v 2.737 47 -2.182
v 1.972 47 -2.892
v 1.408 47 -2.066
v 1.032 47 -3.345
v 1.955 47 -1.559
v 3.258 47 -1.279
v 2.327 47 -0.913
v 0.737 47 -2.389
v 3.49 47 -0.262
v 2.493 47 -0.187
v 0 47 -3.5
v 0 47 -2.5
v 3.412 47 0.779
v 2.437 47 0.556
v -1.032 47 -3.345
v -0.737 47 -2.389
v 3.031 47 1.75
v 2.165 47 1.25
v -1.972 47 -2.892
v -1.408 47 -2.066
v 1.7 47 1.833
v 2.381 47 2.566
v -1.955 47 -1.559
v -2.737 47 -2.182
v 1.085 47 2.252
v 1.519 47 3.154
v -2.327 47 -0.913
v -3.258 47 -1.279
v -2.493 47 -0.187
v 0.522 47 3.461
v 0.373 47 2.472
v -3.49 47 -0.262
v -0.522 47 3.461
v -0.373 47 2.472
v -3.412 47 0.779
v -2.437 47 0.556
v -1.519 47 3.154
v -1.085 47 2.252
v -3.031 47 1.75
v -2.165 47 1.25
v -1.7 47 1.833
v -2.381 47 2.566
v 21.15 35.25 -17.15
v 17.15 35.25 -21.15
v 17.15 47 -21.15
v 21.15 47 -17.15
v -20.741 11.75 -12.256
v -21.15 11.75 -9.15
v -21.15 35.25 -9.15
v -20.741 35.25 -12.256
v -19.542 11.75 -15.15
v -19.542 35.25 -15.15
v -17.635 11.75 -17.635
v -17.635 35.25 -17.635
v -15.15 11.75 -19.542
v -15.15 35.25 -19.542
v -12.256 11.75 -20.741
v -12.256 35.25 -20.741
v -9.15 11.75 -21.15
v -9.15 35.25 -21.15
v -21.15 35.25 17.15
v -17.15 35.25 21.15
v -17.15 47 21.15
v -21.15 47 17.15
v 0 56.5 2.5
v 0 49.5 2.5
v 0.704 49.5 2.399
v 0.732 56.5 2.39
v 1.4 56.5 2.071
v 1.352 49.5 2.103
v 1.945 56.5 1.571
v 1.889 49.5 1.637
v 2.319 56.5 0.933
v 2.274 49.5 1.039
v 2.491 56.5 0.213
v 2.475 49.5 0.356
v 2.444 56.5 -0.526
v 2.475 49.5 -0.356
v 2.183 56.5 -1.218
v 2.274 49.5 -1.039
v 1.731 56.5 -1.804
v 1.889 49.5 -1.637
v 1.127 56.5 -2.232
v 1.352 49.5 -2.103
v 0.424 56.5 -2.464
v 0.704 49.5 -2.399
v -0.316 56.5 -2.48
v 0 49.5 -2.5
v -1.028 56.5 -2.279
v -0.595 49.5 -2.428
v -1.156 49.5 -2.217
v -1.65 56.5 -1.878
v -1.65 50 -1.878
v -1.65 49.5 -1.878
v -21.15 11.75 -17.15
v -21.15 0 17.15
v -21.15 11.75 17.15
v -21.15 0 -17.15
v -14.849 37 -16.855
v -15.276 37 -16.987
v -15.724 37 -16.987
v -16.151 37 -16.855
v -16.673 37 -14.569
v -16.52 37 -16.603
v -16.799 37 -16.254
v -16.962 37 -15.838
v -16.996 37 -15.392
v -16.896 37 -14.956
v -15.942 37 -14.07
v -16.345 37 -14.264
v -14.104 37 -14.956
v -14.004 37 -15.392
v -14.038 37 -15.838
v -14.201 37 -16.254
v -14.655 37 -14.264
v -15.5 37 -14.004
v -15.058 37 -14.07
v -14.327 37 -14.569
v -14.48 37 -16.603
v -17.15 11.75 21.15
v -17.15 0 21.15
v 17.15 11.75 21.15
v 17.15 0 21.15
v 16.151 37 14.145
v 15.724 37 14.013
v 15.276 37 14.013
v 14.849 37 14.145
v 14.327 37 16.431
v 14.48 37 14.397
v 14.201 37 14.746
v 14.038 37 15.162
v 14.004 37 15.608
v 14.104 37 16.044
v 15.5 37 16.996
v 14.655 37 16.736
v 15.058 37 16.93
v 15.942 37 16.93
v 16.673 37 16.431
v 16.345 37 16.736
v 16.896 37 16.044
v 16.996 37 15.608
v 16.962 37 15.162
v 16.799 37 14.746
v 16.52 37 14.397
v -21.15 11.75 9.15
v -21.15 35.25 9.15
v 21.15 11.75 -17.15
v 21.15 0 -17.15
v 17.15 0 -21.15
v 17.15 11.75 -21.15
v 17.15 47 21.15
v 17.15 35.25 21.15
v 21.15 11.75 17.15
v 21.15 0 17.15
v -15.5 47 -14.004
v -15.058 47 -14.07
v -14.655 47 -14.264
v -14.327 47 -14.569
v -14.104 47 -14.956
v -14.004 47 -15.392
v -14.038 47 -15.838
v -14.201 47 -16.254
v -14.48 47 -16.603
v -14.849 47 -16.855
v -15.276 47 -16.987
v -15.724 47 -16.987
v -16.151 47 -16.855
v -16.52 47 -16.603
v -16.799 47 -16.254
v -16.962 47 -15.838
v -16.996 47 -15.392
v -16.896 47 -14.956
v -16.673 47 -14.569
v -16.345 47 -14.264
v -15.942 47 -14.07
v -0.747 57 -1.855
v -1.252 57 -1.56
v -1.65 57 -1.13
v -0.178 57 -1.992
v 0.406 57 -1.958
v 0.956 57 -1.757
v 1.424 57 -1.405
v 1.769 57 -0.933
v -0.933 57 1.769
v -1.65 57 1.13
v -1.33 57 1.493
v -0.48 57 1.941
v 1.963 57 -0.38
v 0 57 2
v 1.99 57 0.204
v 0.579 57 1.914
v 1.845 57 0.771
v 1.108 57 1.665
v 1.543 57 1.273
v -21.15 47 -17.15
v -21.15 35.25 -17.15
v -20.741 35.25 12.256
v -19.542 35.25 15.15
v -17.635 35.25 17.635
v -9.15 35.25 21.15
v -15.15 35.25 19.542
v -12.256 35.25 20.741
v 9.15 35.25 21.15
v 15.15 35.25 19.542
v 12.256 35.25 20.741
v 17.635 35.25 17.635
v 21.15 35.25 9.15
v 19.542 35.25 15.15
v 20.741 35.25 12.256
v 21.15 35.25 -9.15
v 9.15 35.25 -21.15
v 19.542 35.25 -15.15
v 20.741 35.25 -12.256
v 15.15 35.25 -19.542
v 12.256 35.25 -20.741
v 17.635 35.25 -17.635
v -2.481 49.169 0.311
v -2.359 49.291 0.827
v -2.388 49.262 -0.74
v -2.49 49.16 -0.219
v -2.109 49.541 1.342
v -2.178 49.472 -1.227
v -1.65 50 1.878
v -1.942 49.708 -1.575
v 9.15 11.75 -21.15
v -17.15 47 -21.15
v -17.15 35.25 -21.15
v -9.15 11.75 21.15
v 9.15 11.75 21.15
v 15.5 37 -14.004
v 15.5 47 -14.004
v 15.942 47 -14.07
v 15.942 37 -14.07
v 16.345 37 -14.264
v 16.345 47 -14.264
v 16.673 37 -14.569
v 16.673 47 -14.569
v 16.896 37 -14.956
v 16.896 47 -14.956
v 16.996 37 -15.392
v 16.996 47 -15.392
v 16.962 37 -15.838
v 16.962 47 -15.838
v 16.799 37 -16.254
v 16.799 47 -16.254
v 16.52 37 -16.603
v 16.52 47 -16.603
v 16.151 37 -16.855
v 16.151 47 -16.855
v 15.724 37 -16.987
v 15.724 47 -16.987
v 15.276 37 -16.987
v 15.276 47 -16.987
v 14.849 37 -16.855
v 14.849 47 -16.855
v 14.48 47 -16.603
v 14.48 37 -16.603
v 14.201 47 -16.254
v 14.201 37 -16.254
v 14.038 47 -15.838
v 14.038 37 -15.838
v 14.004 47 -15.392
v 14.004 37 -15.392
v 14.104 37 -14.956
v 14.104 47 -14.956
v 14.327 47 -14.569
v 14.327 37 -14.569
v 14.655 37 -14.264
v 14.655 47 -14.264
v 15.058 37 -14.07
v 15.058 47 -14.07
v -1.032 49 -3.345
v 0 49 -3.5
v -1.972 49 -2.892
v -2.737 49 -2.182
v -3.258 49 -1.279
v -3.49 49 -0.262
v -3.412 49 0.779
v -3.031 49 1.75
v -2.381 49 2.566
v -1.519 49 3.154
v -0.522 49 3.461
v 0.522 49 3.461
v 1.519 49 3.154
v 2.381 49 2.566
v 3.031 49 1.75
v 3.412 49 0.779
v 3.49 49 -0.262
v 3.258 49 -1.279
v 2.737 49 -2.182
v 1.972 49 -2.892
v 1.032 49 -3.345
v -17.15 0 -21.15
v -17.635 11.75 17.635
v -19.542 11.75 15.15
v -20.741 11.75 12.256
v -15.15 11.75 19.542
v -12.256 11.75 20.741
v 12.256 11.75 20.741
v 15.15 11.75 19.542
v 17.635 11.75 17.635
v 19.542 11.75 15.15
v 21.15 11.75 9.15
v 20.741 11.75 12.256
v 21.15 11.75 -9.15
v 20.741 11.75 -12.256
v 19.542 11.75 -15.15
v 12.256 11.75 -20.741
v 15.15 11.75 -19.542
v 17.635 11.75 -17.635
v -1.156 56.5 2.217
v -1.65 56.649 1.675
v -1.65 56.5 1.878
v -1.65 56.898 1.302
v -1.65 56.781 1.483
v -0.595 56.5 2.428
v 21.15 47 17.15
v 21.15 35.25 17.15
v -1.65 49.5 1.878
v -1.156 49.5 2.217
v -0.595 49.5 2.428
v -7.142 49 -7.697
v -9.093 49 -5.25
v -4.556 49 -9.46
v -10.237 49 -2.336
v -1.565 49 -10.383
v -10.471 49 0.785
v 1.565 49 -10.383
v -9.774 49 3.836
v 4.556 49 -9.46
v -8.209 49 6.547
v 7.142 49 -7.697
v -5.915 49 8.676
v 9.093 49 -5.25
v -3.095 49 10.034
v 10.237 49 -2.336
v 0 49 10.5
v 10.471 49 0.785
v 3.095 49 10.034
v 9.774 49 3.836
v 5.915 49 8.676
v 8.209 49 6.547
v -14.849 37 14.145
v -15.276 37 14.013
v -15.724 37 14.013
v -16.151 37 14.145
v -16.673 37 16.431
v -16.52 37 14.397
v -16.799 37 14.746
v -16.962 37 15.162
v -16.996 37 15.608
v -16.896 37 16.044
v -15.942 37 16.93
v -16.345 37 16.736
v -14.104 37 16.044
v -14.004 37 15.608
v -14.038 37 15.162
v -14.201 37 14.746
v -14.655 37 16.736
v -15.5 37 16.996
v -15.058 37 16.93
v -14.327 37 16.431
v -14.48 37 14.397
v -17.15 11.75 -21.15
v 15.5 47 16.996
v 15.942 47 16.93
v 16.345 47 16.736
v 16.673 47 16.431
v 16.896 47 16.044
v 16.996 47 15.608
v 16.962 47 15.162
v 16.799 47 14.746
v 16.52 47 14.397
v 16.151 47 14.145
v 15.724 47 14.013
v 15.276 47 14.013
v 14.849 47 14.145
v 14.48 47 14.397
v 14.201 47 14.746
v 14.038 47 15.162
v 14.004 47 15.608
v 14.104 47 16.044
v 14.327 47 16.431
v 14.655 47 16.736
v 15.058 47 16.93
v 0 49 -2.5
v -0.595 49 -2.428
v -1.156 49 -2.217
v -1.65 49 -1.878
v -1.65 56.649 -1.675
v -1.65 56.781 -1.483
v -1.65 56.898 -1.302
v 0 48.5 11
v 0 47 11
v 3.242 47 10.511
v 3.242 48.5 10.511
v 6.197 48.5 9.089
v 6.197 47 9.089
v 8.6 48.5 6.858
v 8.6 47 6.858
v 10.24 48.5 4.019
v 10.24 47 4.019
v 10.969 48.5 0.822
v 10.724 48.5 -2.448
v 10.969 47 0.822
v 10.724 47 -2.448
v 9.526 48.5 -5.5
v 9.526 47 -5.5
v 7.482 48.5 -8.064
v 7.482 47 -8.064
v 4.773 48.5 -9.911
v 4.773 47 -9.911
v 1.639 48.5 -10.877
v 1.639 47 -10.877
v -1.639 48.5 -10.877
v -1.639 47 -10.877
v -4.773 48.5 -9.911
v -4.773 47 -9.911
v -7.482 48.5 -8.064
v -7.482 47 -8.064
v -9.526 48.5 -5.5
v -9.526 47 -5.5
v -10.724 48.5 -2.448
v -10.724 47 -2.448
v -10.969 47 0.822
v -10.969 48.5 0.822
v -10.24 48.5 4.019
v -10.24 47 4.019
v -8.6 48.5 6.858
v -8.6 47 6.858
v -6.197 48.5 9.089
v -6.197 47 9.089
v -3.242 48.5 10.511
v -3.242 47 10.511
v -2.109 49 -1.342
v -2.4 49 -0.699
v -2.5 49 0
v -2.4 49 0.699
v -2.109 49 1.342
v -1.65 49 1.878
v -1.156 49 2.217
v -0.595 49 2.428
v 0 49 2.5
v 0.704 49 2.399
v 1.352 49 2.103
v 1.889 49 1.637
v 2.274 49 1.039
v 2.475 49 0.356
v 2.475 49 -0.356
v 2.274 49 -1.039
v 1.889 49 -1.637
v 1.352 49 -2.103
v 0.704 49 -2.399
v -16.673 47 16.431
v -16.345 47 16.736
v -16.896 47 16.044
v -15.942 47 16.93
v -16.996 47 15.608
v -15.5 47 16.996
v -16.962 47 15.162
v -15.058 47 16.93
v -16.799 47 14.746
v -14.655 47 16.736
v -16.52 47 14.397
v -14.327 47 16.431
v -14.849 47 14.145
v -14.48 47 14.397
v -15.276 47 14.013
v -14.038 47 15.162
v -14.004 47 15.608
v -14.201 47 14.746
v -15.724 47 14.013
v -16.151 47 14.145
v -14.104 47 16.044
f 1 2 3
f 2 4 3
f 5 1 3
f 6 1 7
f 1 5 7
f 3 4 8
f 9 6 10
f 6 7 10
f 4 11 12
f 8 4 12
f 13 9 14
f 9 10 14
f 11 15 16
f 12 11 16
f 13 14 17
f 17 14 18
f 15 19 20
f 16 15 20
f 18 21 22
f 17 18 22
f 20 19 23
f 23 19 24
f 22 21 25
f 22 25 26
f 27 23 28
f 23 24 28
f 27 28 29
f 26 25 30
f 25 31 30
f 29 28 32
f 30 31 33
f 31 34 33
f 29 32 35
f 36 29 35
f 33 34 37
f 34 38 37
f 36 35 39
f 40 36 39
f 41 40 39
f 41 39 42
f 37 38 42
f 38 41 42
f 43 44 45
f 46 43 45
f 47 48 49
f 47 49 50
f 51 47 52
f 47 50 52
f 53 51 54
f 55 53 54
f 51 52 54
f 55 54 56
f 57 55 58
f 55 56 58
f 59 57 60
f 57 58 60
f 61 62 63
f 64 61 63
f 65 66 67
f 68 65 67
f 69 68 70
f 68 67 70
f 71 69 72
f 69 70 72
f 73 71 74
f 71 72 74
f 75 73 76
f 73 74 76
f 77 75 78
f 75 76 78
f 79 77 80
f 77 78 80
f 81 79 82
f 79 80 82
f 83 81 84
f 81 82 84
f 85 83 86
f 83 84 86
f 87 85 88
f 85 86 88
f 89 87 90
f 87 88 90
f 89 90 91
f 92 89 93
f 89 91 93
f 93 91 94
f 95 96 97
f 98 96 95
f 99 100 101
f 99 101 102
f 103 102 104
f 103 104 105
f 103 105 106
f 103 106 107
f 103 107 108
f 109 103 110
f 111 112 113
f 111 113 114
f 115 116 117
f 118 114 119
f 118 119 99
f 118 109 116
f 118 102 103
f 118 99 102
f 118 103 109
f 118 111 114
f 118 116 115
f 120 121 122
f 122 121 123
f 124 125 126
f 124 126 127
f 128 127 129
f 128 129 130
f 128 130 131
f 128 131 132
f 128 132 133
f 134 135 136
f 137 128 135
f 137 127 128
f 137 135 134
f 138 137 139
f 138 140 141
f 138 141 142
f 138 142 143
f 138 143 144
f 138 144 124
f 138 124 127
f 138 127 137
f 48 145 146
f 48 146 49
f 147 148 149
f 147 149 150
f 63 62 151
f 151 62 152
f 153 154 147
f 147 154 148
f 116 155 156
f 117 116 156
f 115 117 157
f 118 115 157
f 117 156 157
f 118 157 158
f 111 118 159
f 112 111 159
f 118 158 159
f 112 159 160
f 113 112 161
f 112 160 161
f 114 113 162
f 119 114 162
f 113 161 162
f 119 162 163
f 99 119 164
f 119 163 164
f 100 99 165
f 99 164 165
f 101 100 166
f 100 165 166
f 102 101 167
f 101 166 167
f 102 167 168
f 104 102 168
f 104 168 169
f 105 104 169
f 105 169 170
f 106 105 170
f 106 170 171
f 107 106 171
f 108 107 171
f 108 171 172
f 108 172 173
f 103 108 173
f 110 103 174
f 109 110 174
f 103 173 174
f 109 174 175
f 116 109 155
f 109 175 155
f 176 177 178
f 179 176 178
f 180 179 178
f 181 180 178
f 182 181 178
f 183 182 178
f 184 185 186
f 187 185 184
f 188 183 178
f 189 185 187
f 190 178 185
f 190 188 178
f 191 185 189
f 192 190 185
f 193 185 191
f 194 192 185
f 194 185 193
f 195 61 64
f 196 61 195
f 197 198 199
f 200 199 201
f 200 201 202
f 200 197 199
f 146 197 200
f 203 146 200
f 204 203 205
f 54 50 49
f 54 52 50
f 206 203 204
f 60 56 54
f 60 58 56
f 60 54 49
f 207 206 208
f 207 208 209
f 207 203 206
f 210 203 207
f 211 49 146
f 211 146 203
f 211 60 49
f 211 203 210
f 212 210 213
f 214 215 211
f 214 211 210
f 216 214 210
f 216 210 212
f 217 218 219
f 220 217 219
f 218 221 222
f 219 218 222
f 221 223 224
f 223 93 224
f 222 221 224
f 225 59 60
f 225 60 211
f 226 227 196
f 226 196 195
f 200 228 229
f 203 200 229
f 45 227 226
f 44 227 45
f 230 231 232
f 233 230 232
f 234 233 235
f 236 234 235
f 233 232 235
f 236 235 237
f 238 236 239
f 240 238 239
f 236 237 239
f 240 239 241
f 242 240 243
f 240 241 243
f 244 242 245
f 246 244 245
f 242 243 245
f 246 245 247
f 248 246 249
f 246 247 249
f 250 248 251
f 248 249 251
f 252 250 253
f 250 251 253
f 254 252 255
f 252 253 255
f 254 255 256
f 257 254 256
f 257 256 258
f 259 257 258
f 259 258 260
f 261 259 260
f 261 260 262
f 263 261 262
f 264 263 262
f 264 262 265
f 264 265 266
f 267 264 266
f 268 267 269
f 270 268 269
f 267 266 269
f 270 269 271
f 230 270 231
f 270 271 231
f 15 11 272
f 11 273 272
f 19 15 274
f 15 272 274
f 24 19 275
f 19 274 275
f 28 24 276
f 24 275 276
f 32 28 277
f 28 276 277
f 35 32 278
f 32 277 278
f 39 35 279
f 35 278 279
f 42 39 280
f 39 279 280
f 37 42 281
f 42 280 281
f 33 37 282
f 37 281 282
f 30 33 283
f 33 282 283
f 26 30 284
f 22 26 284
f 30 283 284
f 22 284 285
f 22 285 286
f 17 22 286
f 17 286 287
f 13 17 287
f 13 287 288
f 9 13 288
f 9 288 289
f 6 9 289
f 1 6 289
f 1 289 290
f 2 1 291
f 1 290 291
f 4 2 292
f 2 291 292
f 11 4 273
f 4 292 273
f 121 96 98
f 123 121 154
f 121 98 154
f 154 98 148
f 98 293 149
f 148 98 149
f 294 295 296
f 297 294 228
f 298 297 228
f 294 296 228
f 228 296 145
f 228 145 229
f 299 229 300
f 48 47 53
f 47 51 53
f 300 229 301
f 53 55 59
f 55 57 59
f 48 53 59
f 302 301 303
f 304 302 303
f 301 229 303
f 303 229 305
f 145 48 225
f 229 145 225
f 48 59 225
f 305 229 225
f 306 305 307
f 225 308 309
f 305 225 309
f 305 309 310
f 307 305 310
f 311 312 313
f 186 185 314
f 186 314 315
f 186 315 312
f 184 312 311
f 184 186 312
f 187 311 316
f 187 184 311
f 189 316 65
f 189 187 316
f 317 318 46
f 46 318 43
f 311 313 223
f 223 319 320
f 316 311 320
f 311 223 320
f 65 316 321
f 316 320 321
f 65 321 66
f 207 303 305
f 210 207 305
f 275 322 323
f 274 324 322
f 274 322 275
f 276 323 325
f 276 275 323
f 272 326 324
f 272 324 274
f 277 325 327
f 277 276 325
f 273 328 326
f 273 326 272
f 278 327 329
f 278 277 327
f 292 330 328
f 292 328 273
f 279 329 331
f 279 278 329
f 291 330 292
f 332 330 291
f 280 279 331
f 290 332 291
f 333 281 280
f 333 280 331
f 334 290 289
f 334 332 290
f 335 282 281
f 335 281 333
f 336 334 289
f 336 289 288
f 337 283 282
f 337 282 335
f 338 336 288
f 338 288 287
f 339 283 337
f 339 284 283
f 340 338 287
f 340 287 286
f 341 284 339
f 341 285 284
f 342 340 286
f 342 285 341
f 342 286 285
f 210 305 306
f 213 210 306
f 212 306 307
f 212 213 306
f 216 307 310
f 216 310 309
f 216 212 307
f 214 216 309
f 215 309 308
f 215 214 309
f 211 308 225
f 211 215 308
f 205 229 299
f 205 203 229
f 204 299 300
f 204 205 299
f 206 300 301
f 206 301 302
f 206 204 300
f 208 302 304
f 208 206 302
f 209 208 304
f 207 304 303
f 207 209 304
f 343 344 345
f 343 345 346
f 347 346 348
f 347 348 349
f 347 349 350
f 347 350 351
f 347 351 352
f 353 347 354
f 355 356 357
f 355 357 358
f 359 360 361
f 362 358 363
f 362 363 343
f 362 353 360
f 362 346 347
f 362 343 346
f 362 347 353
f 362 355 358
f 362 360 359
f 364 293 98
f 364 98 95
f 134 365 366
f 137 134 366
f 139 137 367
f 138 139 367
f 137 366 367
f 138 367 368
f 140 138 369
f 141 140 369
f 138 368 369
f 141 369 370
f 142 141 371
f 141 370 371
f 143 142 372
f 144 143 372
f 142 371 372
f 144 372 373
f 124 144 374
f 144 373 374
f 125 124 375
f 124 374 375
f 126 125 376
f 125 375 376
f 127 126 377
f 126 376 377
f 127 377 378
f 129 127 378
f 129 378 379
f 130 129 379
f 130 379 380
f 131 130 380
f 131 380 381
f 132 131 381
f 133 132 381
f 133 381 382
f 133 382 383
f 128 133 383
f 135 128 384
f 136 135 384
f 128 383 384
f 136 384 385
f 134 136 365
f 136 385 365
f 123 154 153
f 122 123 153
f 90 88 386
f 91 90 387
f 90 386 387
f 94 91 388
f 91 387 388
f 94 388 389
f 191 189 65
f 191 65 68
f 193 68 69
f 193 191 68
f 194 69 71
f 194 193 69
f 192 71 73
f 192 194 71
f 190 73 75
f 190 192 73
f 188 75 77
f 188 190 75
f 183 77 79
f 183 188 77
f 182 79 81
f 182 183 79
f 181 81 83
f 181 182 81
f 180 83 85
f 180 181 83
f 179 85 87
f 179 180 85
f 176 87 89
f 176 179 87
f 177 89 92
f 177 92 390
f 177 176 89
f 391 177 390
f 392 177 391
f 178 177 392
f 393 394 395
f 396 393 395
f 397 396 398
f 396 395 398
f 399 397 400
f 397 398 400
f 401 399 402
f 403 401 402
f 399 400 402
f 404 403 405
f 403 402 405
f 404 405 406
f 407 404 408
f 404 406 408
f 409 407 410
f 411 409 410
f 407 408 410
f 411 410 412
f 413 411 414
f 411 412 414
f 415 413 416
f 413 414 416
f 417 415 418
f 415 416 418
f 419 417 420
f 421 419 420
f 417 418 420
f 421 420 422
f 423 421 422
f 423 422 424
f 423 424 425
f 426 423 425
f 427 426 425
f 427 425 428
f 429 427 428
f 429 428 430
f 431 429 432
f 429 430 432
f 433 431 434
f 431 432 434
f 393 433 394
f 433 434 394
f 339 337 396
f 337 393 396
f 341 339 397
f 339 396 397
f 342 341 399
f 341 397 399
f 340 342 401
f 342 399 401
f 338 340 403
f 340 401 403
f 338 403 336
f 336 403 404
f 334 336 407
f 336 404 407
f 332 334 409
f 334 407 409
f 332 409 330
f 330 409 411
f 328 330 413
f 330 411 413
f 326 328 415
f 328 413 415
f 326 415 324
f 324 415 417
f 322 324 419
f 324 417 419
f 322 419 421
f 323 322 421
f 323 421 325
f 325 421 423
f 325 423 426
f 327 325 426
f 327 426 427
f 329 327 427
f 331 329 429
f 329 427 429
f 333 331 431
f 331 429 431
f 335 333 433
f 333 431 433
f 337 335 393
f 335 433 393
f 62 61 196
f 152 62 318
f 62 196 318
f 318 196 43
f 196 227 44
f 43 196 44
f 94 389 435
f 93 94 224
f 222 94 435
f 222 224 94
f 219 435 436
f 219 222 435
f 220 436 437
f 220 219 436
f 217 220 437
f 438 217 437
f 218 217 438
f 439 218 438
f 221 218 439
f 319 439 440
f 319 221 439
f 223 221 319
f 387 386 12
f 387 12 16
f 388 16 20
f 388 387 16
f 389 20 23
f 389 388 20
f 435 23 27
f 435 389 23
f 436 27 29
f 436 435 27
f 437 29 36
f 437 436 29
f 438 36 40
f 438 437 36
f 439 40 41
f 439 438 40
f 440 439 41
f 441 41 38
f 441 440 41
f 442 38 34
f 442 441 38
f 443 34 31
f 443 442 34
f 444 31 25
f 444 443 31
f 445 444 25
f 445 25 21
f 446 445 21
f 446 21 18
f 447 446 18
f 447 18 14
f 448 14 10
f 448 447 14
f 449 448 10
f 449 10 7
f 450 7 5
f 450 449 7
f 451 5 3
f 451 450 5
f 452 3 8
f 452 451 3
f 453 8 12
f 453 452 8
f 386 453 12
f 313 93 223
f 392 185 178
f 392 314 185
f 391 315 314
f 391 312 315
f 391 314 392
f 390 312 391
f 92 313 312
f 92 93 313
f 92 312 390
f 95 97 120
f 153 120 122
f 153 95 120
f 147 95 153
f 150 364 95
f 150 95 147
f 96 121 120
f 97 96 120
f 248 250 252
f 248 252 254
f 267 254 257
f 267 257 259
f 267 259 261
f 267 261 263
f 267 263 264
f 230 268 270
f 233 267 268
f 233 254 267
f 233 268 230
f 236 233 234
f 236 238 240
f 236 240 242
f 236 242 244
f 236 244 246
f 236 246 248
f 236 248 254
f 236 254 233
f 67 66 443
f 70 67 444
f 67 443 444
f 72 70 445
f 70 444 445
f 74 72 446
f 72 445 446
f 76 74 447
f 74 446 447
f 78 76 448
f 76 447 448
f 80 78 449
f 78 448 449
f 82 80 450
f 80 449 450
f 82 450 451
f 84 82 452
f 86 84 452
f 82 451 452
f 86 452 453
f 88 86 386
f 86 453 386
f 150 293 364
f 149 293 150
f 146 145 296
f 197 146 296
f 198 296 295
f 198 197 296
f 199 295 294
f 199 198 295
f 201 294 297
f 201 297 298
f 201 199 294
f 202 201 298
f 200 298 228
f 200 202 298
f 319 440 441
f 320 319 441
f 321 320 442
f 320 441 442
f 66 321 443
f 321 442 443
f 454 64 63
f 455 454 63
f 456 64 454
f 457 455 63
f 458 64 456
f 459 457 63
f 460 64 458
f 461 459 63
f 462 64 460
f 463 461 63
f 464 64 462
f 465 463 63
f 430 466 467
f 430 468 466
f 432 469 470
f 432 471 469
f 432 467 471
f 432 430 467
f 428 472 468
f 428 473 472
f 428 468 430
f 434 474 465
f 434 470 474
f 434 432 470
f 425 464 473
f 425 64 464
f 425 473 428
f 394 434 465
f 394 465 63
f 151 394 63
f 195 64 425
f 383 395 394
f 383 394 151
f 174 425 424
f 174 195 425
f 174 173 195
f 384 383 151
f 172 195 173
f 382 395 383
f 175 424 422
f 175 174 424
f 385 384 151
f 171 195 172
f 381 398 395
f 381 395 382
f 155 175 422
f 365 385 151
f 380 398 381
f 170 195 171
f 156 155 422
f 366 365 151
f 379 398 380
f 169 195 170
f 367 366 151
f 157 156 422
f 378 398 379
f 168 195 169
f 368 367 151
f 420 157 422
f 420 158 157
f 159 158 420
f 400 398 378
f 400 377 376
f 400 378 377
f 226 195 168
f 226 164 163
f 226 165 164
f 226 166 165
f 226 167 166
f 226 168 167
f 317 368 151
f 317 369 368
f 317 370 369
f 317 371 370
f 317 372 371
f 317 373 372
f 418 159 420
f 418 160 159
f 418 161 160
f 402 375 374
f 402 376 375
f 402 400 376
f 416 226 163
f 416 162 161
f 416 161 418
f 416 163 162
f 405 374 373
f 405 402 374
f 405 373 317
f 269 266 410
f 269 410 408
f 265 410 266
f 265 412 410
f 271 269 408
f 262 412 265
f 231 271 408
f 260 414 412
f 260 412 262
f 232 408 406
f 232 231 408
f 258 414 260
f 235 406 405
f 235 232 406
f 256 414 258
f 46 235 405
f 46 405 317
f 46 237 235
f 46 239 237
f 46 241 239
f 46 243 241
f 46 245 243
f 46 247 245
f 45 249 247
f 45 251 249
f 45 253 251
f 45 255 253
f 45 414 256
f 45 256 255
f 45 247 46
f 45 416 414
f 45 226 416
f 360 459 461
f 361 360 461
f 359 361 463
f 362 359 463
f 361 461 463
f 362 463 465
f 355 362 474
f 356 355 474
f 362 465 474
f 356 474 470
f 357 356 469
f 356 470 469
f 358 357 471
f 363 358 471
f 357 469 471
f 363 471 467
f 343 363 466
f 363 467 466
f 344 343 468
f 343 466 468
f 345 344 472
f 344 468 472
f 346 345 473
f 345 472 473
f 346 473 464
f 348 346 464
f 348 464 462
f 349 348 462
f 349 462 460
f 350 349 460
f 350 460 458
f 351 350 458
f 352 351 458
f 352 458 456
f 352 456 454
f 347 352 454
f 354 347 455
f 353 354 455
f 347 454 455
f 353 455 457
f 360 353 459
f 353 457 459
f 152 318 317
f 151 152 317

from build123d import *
from build123d.topology import SkipClean

# Parameters (mm, degrees)
SKETCH1_W               = 42.3
SKETCH1_H               = 42.3
BOSS_EXTRUDE1_DEPTH     = 11.75
SKETCH2_W               = 42.3
SKETCH2_H               = 42.3
BOSS_EXTRUDE2_DEPTH     = 23.5
FILLET2_R               = 12
SKETCH4_W               = 42.3
SKETCH4_H               = 42.3
BOSS_EXTRUDE3_DEPTH     = 11.75
SKETCH6_W               = 42.3
SKETCH6_H               = 42.3
BOSS_EXTRUDE4_DEPTH     = 11.75
CHAMFER3_SIZE           = 4
CHAMFER4_SIZE           = 4
SKETCH7_R               = 11
BOSS_EXTRUDE5_DEPTH     = 2
SKETCH8_R               = 2.5
BOSS_EXTRUDE6_DEPTH     = 10
CHAMFER5_SIZE           = 0.5
CHAMFER9_SIZE           = 0.5
SKETCH15_W              = 1.000182245
SKETCH15_H              = 2.5
SKETCH18_R              = 1.5
CUT_EXTRUDE4_DEPTH      = 10
CUT_EXTRUDE5_DEPTH      = 65.37115037
CUT_EXTRUDE5_DEPTH_BACK = 65.37115037
CHAMFER11_SIZE          = 1


with BuildPart() as part:
    # Sketch1 → Boss-Extrude1 (new body)
    with BuildSketch(Plane(origin=(0, 0, 0), x_dir=(1, 0, 0), z_dir=(0, 1, 0))):
        Rectangle(SKETCH1_W, SKETCH1_H)
    extrude(amount=BOSS_EXTRUDE1_DEPTH)

    # Sketch4 → Boss-Extrude3 (add)
    with BuildSketch(Plane(origin=(0, 0, 0), x_dir=(1, 0, 0), z_dir=(0, 1, 0))):
        Rectangle(SKETCH4_W, SKETCH4_H)
    extrude(amount=BOSS_EXTRUDE3_DEPTH)

    # Chamfer3
    chamfer3_edges = [part.edges().sort_by_distance(p)[0] for p in [
        (21.15, 5.875, -21.15),
        (21.15, 5.875, 21.15),
        (-21.15, 5.875, 21.15),
        (-21.15, 5.875, -21.15),
    ]]
    chamfer(chamfer3_edges, length=CHAMFER3_SIZE)


with BuildPart() as body_2:
    # Sketch2 → Boss-Extrude2 (new body)
    with BuildSketch(Plane(origin=(0, 11.75, 0), x_dir=(1, 0, 0), z_dir=(0, 1, 0))):
        Rectangle(SKETCH2_W, SKETCH2_H)
    extrude(amount=BOSS_EXTRUDE2_DEPTH)

    # Fillet2
    fillet2_edges = [body_2.edges().sort_by_distance(p)[0] for p in [
        (21.15, 23.5, -21.15),
        (21.15, 23.5, 21.15),
        (-21.15, 23.5, 21.15),
        (-21.15, 23.5, -21.15),
    ]]
    fillet(fillet2_edges, radius=FILLET2_R)


with BuildPart() as body_3:
    # Sketch6 → Boss-Extrude4 (new body)
    with BuildSketch(Plane(origin=(0, 35.25, 0), x_dir=(1, 0, 0), z_dir=(0, 1, 0))):
        Rectangle(SKETCH6_W, SKETCH6_H)
    extrude(amount=BOSS_EXTRUDE4_DEPTH)

    # Chamfer4
    chamfer4_edges = [body_3.edges().sort_by_distance(p)[0] for p in [
        (21.15, 41.125, -21.15),
        (21.15, 41.125, 21.15),
        (-21.15, 41.125, 21.15),
        (-21.15, 41.125, -21.15),
    ]]
    chamfer(chamfer4_edges, length=CHAMFER4_SIZE)

    # Sketch7 → Boss-Extrude5 (add)
    with BuildSketch(Plane(origin=(0, 47, 0), x_dir=(1, 0, 0), z_dir=(0, 1, 0))):
        with Locations(Location((0, 0, 0), (0, 0, 270))):
            Circle(SKETCH7_R)
    extrude(amount=BOSS_EXTRUDE5_DEPTH)

    # Sketch8 → Boss-Extrude6 (add)
    with BuildSketch(Plane(origin=(0, 47, 0), x_dir=(1, 0, 0), z_dir=(0, 1, 0))):
        with Locations(Location((0, 0, 0), (0, 0, 270))):
            Circle(SKETCH8_R)
    extrude(amount=BOSS_EXTRUDE6_DEPTH)

    # Chamfer5
    chamfer5_edges = [body_3.edges().sort_by_distance(p)[0] for p in [
        (0, 57, -2.5),
    ]]
    chamfer(chamfer5_edges, length=CHAMFER5_SIZE)

    # Chamfer9
    chamfer9_edges = [body_3.edges().sort_by_distance(p)[0] for p in [
        (0, 49, -11),
    ]]
    chamfer(chamfer9_edges, length=CHAMFER9_SIZE)

    # Sketch15 → Cut-Revolve1 (revolve, cut)
    with SkipClean():  # the faces are left unmerged after this step: merging them gives an invalid solid
        with BuildSketch(Plane.XY, mode=Mode.PRIVATE) as cut_revolve1_sk:
            with Locations((3.000091123, 48.25)):
                Rectangle(SKETCH15_W, SKETCH15_H)
        revolve(cut_revolve1_sk.sketch.rotate(Axis((0, 0, 0), (0, 1, 0)), 90), axis=Axis((0, 0, 0), (0, 1, 0)), mode=Mode.SUBTRACT)

    # Sketch18 → Cut-Extrude4 (cut)
    with SkipClean():  # the faces are left unmerged after this step: merging them gives an invalid solid
        with BuildSketch(Plane(origin=(0, 47, 0), x_dir=(1, 0, 0), z_dir=(0, 1, 0))):
            with Locations(Location((15.5, 15.503856364, 0), (0, 0, 270))):
                Circle(SKETCH18_R)
            with Locations(Location((15.5, -15.496143636, 0), (0, 0, 270))):
                Circle(SKETCH18_R)
            with Locations(Location((-15.5, -15.496143636, 0), (0, 0, 270))):
                Circle(SKETCH18_R)
            with Locations(Location((-15.5, 15.503856364, 0), (0, 0, 270))):
                Circle(SKETCH18_R)
        extrude(amount=-CUT_EXTRUDE4_DEPTH, mode=Mode.SUBTRACT)

    # Sketch19 → Cut-Extrude5 (cut, two sides: drawn at the far end of the back side and taken through both)
    with BuildSketch(Plane.XY.offset(-CUT_EXTRUDE5_DEPTH_BACK)):
        Polygon((-2.5, 56.5), (-2.5, 49), (-1.65, 49), (-1.65, 57), (-2, 57), align=None)
    extrude(amount=CUT_EXTRUDE5_DEPTH + CUT_EXTRUDE5_DEPTH_BACK, mode=Mode.SUBTRACT)

    # Chamfer11
    # the kernel refuses this chamfer: 1 mm, written as the material it adds along each edge
    with BuildSketch(Plane(origin=(-1.65, 49, -4.449846985), x_dir=(0.0274958766105862, 0.9996219169112968, 0), z_dir=(0, 0, 1))) as chamfer11_piece_1_section:
        Polygon((CHAMFER11_SIZE * 0.999621916911, CHAMFER11_SIZE * 0.0274958766106), (-CHAMFER11_SIZE * 0.0274958766106, CHAMFER11_SIZE * 0.999621916911), (0, 0), align=None)
    chamfer11_piece_1 = extrude(amount=8.89969397, mode=Mode.PRIVATE)
    chamfer11_piece_1 = chamfer11_piece_1 & Plane(origin=(0, 49.369319322, 0), x_dir=(0, 0, -1), z_dir=(0, 1, 0)) * Cylinder(2.5, 22, mode=Mode.PRIVATE)
    add(chamfer11_piece_1)


solid = Compound([part.part, body_2.part, body_3.part])
